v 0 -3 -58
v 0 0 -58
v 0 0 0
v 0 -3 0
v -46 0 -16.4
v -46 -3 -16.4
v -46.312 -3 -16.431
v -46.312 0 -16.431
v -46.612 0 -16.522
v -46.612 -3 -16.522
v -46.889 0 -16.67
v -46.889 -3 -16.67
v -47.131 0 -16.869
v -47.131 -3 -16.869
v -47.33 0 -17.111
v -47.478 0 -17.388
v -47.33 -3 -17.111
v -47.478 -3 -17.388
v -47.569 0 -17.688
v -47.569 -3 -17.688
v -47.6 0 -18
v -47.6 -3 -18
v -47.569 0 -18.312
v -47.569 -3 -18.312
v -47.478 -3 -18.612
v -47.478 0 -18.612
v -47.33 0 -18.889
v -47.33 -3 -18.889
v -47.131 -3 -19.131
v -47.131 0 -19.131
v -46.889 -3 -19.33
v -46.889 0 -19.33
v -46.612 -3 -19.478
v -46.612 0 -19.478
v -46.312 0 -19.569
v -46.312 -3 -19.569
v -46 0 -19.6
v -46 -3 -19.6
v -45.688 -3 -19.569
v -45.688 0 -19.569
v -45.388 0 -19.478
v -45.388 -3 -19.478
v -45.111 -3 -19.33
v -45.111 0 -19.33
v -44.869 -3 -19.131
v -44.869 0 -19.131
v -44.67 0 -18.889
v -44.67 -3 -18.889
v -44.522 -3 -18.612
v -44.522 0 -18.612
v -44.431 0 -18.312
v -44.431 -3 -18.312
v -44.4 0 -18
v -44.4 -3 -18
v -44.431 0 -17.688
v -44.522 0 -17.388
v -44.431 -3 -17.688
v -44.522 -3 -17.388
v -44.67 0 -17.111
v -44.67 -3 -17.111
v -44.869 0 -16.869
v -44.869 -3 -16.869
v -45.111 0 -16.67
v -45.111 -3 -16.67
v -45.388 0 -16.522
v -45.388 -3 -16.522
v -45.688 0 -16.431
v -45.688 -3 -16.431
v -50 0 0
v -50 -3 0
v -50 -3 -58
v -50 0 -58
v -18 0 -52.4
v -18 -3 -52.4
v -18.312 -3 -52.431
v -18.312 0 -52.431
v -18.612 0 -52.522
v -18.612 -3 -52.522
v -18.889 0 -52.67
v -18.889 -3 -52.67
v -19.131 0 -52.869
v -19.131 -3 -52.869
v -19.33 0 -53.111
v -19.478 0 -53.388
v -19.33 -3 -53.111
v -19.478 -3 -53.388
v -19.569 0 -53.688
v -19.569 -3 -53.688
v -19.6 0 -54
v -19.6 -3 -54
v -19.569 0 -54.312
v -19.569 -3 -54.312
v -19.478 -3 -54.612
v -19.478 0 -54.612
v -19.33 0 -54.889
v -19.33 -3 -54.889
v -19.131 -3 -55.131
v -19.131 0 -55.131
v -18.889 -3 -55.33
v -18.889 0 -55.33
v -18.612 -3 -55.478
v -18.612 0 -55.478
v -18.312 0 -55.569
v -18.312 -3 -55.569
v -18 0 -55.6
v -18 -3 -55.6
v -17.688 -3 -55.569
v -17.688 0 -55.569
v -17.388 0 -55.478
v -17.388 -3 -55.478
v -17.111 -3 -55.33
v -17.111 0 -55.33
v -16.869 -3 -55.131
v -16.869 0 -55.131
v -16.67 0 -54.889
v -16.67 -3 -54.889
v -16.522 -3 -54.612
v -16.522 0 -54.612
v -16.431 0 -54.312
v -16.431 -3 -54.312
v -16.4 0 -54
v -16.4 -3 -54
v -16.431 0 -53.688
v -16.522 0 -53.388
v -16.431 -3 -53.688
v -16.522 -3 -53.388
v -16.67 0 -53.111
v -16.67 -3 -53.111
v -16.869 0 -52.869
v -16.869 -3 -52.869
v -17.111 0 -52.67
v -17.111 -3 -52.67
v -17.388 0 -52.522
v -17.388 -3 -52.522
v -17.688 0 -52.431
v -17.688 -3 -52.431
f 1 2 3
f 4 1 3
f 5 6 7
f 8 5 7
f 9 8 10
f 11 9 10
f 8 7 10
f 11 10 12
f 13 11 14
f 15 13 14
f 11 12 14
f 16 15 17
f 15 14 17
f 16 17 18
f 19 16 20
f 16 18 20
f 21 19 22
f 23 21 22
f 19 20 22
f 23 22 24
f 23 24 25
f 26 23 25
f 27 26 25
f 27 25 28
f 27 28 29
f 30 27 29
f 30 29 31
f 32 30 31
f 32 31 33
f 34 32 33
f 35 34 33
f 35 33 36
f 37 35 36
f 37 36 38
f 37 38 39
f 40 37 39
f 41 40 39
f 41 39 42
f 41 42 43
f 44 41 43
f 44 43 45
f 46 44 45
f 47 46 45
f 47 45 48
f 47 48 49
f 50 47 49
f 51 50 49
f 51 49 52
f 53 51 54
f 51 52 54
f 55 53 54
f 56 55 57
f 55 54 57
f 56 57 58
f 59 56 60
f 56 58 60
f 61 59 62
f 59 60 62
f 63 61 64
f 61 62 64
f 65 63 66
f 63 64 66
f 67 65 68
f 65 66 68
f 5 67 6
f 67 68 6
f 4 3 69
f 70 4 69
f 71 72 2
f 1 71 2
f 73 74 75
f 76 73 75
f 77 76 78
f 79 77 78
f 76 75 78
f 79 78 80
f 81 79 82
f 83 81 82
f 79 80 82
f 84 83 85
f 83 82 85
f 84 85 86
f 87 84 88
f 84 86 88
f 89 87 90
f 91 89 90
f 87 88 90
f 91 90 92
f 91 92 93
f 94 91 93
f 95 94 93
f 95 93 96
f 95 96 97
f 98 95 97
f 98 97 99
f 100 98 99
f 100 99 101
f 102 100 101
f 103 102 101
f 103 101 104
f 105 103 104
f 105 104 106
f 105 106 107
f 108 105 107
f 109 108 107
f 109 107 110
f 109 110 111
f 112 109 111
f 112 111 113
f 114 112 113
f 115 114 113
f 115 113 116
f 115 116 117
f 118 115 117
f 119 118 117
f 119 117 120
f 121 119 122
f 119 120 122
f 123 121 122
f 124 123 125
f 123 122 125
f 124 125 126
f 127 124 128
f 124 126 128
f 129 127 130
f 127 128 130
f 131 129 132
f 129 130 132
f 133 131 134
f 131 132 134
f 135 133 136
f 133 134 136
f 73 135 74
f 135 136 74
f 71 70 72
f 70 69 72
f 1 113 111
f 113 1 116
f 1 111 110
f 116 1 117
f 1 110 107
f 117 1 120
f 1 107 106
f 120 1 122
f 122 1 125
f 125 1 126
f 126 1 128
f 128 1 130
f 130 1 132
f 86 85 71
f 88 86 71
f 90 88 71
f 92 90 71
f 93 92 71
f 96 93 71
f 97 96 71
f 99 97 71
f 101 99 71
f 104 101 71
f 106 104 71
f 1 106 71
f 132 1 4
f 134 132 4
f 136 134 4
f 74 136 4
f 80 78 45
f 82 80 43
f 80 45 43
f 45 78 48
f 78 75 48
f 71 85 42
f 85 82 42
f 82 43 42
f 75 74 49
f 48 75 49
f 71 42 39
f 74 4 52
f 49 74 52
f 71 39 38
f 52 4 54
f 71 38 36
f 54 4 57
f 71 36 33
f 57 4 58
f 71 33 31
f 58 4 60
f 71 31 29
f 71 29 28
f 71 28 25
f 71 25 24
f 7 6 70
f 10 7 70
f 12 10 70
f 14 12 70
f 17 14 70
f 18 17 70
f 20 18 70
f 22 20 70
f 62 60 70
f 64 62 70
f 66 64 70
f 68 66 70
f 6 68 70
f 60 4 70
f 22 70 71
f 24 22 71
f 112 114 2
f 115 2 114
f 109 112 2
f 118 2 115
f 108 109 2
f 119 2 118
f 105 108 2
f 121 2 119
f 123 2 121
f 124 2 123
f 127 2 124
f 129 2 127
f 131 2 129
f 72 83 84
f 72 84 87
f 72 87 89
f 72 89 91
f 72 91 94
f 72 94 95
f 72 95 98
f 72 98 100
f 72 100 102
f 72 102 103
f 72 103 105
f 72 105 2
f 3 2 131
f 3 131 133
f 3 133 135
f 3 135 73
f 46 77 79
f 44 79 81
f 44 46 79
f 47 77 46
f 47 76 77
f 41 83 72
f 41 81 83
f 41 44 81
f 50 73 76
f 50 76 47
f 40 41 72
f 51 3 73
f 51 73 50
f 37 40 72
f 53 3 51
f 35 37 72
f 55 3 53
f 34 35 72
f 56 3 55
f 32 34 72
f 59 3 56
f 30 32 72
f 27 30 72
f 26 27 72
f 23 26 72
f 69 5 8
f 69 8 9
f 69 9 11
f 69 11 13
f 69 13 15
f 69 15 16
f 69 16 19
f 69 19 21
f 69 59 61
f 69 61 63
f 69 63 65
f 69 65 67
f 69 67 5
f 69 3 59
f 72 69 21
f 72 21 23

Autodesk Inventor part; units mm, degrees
ref_plane "YZ Plane" through (0, 0, 0) normal (1, 0, 0) x (0, 1, 0)
ref_plane "XZ Plane" through (0, 0, 0) normal (0, 1, 0) x (-1, 0, 0)
ref_plane "XY Plane" through (0, 0, 0) normal (0, 0, 1) x (1, 0, 0)
sketch "Sketch1" plane through (0, 0, 0) normal (0, 1, 0) x (-1, 0, 0)
  line L0 (0, 0) -> (50, 0)
  line L1 (50, 0) -> (50, -58)
  line L2 (50, -58) -> (0, -58)
  line L3 (0, -58) -> (0, 0)
  line L4 (46, 11.182) -> (46, -76.3332) construction
  line L5 (62.4819, -54) -> (-10.7264, -54) construction
  point P0 (46, -18)
  point P1 (18, -54)
  dimension "d0" = 50
  dimension "d1" = 58
  dimension "d2" = 4
  dimension "d3" = 4
  dimension "d4" = 18
  dimension "d5" = 18
extrude "Extrusion1" add sketch "Sketch1" against normal blind 3
hole "Hole1" at (-46, 0, -18) at (-18, 0, -54) direction (0, -1, 0) diameter 3.2 end through all
properties part number "Step-back cover -electronics enc"
